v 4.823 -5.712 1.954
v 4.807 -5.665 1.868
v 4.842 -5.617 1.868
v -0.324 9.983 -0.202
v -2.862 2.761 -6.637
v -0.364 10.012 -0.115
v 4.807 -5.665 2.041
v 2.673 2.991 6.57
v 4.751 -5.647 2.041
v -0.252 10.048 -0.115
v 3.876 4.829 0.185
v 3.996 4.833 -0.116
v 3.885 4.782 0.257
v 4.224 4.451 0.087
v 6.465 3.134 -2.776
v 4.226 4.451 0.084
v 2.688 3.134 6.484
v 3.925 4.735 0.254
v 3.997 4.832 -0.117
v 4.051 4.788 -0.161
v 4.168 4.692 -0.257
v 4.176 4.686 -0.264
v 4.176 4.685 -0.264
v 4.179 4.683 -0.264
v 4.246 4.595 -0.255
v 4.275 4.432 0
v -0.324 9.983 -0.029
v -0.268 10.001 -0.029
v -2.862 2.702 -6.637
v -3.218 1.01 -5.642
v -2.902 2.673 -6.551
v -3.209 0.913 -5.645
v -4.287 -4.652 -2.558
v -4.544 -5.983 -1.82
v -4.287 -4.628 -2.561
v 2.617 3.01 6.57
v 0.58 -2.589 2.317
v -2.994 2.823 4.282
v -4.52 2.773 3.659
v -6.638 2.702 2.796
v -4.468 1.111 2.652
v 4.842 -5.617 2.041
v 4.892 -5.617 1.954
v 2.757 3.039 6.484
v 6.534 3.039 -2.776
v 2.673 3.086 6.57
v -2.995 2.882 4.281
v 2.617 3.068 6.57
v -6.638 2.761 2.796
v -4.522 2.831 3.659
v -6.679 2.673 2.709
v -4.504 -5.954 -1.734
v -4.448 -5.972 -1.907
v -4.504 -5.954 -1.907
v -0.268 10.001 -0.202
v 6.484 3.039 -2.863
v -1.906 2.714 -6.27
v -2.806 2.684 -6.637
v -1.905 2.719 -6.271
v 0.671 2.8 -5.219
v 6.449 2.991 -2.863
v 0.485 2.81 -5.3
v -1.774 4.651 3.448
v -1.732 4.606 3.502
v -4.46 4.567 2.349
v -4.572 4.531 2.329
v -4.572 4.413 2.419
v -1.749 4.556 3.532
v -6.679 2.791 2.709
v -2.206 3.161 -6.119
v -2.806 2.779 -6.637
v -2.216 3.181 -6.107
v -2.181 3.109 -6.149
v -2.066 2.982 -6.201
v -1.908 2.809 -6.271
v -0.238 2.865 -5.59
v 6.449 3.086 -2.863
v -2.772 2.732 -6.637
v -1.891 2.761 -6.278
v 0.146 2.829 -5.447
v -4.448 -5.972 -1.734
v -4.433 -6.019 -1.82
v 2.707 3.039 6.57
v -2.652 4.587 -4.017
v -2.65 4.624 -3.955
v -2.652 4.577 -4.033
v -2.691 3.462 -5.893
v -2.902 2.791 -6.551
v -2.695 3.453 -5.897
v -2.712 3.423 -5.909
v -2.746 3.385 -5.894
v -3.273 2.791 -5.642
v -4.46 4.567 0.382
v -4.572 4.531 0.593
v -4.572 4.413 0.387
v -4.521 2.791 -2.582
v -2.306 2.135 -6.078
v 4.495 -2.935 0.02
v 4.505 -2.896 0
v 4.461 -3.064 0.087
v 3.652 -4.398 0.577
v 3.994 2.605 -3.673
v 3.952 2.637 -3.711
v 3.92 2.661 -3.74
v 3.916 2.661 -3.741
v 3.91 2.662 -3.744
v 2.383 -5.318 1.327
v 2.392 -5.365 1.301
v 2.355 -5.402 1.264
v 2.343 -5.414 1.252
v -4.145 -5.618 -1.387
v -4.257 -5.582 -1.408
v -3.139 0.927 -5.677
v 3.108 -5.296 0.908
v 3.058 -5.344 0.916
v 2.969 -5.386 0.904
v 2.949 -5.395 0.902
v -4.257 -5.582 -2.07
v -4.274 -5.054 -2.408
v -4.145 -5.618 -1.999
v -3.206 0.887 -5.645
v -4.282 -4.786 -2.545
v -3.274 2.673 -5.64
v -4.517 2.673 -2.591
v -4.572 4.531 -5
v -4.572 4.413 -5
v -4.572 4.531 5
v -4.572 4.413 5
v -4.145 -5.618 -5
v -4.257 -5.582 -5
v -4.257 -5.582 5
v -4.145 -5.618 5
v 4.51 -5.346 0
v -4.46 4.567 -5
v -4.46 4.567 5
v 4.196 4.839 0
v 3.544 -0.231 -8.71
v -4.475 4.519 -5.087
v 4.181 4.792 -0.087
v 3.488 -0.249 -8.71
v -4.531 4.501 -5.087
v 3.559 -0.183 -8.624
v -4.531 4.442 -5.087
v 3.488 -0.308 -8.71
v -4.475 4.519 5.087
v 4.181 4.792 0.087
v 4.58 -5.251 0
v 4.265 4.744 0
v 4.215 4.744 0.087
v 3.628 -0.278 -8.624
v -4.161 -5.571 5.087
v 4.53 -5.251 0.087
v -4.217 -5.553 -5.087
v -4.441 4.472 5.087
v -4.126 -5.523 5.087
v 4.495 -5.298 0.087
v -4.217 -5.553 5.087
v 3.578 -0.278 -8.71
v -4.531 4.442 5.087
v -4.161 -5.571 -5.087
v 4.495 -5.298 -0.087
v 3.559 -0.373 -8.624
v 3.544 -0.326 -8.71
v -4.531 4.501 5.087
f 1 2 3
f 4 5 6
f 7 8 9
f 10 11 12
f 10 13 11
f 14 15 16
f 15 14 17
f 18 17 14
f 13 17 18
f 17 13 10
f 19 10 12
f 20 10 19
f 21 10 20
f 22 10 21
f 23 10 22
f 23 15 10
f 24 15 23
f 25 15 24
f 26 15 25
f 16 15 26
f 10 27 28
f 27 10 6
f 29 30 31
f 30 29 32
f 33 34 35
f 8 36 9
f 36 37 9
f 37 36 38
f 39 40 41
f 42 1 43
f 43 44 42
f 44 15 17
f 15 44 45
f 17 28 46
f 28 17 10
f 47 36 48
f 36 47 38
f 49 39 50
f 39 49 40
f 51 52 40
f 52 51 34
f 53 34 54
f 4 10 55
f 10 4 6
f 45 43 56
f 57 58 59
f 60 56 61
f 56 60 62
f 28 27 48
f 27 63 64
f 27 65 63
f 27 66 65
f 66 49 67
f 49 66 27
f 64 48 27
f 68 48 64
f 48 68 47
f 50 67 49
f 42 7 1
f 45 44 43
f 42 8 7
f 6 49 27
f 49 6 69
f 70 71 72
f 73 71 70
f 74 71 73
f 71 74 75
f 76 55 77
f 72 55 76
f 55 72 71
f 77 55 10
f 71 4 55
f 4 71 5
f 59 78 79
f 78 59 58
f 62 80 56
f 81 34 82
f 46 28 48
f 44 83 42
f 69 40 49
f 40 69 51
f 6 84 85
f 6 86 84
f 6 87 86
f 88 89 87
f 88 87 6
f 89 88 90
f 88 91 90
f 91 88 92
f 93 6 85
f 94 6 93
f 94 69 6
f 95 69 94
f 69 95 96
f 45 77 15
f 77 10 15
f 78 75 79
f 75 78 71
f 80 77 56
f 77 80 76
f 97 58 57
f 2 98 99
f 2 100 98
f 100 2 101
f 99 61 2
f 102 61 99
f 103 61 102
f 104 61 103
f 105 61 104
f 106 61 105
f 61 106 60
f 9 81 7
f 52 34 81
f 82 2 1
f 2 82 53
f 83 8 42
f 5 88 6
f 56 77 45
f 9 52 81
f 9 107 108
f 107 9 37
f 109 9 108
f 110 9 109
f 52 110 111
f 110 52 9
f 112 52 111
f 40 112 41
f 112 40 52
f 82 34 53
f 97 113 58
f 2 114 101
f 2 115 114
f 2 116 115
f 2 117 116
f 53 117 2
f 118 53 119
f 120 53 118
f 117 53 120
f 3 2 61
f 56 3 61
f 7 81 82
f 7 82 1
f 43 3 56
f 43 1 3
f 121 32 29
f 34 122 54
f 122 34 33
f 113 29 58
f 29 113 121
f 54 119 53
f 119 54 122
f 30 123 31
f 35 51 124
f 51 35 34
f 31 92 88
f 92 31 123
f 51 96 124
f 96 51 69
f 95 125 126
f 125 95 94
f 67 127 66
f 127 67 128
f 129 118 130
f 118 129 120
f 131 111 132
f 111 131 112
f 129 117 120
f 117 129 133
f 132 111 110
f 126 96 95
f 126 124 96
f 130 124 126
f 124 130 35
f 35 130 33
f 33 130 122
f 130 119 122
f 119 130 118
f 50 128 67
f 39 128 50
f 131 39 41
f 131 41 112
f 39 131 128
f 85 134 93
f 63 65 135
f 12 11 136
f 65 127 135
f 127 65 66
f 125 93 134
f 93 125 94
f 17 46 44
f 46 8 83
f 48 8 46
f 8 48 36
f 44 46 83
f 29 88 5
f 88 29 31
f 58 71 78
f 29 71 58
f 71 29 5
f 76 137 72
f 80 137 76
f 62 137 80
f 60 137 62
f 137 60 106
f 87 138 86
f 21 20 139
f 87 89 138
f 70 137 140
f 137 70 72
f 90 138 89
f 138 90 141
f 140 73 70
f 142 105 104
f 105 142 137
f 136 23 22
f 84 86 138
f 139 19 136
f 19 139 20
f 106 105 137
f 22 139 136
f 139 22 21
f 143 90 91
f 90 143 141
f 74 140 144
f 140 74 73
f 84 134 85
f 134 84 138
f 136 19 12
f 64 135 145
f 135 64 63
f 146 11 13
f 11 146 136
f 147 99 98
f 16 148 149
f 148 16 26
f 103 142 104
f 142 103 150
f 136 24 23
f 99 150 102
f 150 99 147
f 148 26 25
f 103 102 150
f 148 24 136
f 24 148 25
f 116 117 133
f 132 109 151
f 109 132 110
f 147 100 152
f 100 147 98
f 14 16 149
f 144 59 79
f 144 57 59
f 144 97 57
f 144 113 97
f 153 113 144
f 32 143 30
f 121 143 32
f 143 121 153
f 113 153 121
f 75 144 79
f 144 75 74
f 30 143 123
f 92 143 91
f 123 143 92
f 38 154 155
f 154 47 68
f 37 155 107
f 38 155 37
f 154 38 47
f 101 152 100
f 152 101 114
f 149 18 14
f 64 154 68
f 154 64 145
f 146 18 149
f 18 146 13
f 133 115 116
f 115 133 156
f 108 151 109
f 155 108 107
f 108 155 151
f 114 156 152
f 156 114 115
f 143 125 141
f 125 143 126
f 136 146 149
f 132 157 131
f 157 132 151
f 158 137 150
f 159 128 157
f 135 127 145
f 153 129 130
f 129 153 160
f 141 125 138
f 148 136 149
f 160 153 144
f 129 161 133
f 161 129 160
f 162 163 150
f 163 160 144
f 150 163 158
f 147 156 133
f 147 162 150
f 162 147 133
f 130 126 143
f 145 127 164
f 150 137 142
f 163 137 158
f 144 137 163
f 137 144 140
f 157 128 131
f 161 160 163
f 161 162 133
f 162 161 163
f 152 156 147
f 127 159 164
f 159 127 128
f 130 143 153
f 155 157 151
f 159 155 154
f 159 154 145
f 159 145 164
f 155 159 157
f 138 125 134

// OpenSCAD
// Auto-generated OpenSCAD file

    inner_points = 10*[[0.4479590588990513, -0.5250898206093074, -7.05324687544362e-13], [0.4165075656405067, 0.4744154588023662, 2.0339285811132868e-13], [-0.417637904288353, -0.5523276127577147, -0.5000000000003288], [-0.44908939754689753, 0.44717766665395897, -0.49999999999942013], [-0.41763790428788994, -0.5523276127586092, 0.49999999999967115], [-0.44908939754643434, 0.44717766665306447, 0.5000000000005798], [0.352813311127668, -0.027836294896346484, -0.862372435696011]];

    outer_points = 10*[[0.26573559772755095, 0.3038927930034916, 0.6483572285355131], [-0.6597836115012342, 0.2731852040296694, 0.2709036057844004], [0.6433673075177818, 0.3038927930034916, -0.27759865149382545], [-0.28215190171100324, 0.2731852040296694, -0.6550522742449382], [0.47917590859784487, -0.5617242025462499, 0.1954218570849814], [-0.4463433006309402, -0.5924317915200721, -0.18203176566613136], [-0.028313936102664725, 0.9953123157758751, -0.01154724575106305]];

    // Convex hull for inner set (I)
    module inner_hull() {
        hull() {
            for (p = inner_points) {
                translate(p) sphere(r=0.1);
            }
        }
    }

    // Convex hull for outer set (O) minus inner hull (O \ I)
    module outer_minus_inner() {
        difference() {
            hull() {
                for (p = outer_points) {
                    translate(p) sphere(r=0.1);
                }
            }
            inner_hull(); // Subtract inner hull
        }
    }

    // Convex hull for outer set (O) minus all translated inner hulls
    module outer_minus_AllTranslationInner() {
        difference() {
            hull() {
                for (p = outer_points) {
                    translate(p) sphere(r=0.1);
                }
            }
            hull() {
                translate([0,0,50]) inner_hull();
                translate([0,0,-50]) inner_hull();
            }; // Subtract translated inner hulls
        }
    }

    // Difference between outer_minus_inner and outer_minus_AllTranslationInner
    module outer_minus_inner_diff() {
        difference() {
            // Outer minus inner
            difference() {
                hull() {
                    for (p = outer_points) {
                        translate(p) sphere(r=0.1);
                    }
                }
                inner_hull();
            }

            // Subtract Outer minus AllTranslationInner
            difference() {
                hull() {
                    for (p = outer_points) {
                        translate(p) sphere(r=0.1);
                    }
                }
                hull() {
                    translate([0,0,50]) inner_hull();
                    translate([0,0,-50]) inner_hull();
                };
            }
        }
    }

    // Rendering all with colors applied
    color([1, 0, 0, 0.5]) inner_hull(); // Transparent red
    color([0, 1, 0, 1]) outer_minus_AllTranslationInner(); // Opaque green
    color([1, 1, 0, 1]) outer_minus_inner_diff(); // Opaque yellow
    
